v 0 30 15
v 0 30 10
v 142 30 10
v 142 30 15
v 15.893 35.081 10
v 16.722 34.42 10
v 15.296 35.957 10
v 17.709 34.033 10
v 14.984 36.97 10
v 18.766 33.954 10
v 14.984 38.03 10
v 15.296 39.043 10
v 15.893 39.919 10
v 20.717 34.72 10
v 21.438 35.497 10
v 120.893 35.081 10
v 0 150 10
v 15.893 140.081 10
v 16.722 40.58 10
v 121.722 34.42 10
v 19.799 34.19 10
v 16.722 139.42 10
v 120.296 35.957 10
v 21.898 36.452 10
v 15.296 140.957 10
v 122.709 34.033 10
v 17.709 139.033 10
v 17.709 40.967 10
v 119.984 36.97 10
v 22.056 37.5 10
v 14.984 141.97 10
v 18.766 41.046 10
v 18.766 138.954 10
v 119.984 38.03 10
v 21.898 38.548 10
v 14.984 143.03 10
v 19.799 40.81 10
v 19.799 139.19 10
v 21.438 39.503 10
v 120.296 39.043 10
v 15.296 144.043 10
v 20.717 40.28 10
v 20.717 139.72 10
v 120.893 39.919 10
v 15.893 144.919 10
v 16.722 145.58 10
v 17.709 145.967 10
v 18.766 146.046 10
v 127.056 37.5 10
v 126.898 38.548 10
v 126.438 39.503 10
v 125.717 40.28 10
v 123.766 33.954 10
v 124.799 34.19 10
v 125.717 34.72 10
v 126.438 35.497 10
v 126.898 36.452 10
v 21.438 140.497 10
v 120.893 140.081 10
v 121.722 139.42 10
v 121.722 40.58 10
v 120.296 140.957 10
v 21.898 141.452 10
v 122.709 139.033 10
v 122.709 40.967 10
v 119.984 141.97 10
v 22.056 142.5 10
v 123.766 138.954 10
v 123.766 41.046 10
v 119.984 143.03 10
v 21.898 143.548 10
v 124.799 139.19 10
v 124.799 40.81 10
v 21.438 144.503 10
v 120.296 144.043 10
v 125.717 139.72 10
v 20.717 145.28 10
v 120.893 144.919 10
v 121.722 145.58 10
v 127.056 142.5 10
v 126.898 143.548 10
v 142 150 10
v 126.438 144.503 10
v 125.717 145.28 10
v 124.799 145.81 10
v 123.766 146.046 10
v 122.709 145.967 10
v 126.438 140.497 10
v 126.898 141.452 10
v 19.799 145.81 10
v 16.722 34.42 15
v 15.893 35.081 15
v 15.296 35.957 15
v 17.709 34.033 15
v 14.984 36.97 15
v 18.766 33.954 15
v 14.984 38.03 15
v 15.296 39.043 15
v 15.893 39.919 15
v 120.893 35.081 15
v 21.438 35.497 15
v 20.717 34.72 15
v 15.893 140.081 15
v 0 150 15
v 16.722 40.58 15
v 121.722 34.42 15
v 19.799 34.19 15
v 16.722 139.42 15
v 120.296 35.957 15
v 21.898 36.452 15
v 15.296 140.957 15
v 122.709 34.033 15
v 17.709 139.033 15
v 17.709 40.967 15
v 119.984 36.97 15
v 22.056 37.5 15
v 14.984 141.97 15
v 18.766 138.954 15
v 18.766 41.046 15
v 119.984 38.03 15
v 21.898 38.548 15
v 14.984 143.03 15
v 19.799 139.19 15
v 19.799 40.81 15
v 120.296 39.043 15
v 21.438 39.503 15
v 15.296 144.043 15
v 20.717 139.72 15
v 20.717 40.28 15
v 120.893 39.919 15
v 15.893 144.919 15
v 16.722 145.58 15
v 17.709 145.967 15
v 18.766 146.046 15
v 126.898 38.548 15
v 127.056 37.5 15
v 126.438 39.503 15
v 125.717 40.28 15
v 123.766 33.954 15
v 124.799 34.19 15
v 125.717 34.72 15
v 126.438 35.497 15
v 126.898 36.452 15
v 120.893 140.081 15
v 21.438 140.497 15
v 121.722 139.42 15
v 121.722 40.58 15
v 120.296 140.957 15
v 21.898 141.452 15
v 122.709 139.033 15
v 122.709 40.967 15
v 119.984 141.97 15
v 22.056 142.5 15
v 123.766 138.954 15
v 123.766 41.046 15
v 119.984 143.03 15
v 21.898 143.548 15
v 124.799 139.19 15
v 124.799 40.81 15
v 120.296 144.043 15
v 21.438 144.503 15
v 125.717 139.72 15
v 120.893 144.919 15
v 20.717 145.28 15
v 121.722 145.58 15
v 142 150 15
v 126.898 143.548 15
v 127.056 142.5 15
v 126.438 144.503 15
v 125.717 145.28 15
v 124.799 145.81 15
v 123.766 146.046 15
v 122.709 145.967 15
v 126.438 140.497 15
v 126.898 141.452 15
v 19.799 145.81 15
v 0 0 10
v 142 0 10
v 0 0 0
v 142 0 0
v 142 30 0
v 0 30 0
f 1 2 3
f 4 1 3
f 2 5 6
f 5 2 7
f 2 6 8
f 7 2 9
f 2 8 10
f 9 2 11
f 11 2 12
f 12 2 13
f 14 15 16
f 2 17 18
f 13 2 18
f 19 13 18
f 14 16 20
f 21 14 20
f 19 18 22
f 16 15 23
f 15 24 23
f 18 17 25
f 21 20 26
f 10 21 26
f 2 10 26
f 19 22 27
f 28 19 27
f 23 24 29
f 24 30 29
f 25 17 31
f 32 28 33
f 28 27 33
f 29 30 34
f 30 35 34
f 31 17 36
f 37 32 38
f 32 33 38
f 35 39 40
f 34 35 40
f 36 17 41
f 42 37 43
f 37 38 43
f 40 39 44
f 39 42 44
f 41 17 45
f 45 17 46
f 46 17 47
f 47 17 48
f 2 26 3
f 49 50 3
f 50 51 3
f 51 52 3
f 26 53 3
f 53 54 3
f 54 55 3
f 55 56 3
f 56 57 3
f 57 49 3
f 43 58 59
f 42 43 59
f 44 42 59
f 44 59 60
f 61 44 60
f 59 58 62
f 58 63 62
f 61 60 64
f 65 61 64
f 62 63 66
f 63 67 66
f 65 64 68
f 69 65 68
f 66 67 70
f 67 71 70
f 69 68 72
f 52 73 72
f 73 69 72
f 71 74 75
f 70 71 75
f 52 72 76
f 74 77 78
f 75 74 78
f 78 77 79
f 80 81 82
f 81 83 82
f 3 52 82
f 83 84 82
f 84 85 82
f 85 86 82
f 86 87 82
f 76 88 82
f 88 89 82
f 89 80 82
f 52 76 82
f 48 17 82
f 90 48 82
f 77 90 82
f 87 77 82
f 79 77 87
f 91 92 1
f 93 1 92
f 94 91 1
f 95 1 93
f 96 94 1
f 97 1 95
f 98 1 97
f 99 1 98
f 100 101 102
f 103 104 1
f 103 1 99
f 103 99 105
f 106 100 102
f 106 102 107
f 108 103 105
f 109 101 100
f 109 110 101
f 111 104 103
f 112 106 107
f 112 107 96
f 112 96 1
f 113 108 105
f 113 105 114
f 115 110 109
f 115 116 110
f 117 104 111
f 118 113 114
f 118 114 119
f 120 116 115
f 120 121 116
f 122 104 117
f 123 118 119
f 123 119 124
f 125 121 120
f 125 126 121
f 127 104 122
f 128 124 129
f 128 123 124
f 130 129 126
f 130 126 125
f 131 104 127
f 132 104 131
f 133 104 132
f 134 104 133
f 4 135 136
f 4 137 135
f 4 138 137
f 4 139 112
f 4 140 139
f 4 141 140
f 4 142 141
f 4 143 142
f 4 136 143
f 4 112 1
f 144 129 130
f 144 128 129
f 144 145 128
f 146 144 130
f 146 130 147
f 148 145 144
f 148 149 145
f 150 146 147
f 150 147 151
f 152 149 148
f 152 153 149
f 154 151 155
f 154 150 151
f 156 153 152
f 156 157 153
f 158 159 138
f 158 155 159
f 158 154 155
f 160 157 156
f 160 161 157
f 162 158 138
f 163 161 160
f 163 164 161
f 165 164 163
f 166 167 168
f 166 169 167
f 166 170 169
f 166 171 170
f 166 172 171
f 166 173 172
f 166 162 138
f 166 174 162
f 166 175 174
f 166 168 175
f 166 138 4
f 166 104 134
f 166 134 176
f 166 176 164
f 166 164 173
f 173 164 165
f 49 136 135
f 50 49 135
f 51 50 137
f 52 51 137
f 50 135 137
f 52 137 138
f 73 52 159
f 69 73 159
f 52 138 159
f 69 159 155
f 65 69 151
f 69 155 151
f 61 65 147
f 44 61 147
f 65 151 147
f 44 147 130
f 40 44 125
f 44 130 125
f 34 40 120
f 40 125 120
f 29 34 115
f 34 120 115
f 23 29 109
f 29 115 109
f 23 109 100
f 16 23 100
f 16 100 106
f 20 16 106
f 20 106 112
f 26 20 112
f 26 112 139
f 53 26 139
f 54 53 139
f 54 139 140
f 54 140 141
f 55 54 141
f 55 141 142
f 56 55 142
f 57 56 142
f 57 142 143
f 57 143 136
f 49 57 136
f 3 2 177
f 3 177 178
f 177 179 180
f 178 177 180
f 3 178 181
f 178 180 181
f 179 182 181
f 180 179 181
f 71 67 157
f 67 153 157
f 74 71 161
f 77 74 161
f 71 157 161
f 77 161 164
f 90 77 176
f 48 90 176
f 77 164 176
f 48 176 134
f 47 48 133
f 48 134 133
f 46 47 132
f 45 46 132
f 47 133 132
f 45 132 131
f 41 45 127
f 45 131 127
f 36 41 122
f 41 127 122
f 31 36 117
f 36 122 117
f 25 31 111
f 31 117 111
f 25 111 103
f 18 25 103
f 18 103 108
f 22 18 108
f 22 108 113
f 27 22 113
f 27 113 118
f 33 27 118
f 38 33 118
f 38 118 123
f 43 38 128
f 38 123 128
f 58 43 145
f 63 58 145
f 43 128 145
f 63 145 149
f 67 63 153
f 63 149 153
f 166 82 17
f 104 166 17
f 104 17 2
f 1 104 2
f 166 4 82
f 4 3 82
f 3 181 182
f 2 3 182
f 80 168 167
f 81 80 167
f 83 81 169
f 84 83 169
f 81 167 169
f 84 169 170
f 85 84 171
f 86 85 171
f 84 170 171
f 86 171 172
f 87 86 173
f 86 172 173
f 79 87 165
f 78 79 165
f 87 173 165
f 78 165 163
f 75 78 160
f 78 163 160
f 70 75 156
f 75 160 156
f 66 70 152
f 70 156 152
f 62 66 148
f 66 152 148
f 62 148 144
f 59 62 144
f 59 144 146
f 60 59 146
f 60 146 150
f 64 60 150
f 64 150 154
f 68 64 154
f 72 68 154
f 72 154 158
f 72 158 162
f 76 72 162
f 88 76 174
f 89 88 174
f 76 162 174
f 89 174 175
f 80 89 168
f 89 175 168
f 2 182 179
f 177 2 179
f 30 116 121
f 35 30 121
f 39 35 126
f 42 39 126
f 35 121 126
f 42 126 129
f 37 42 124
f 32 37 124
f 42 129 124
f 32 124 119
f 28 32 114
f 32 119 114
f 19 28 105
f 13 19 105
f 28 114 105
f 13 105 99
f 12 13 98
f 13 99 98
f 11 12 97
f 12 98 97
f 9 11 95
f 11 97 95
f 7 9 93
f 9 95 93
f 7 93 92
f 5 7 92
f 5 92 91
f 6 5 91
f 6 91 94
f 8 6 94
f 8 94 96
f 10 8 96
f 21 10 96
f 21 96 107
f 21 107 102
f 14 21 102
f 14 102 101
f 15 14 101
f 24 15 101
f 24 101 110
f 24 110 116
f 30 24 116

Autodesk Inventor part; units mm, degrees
ref_plane "YZ Plane" through (0, 0, 0) normal (1, 0, 0) x (0, 1, 0)
ref_plane "XZ Plane" through (0, 0, 0) normal (0, 1, 0) x (-1, 0, 0)
ref_plane "XY Plane" through (0, 0, 0) normal (0, 0, 1) x (1, 0, 0)
sketch "Sketch1" plane through (0, 0, 0) normal (0, 0, 1) x (1, 0, 0)
  line L0 (0, 0) -> (142, 0)
  line L1 (142, 0) -> (142, 30)
  line L2 (142, 30) -> (0, 30)
  line L3 (0, 30) -> (0, 0)
  dimension "d0" = 30
  dimension "d1" = 142
extrude "Extrusion1" add sketch "Sketch1" along normal blind 10
sketch "Sketch2" plane through (0, 0, 10) normal (0, 0, 1) x (1, 0, 0)
  line L0 (0, 30) -> (0, 0) projected
  line L1 (0, 30) -> (142, 30)
  line L2 (142, 30) -> (142, 150)
  line L3 (142, 150) -> (0, 150)
  line L4 (0, 150) -> (0, 30)
  dimension "d4" = 120
extrude "Extrusion2" add sketch "Sketch2" along normal blind 5
sketch "Sketch3" plane through (0, 0, 15) normal (0, 0, 1) x (1, 0, 0)
  line L0 (142, 30) -> (142, 150) construction
  line L1 (142, 150) -> (0, 150) construction
  line L2 (0, 150) -> (0, 30) construction
  line L3 (0, 30) -> (142, 30) construction
  line L4 (18.5, 142.5) -> (123.5, 142.5) construction
  line L5 (123.5, 142.5) -> (123.5, 37.5) construction
  line L6 (123.5, 37.5) -> (18.5, 37.5) construction
  line L7 (18.5, 37.5) -> (18.5, 142.5) construction
  line L8 (142, 150) -> (0, 150) projected
  line L9 (71, 150) -> (71, 142.5) construction
  circle A0 centre (18.5, 142.5) radius 3.556
  circle A1 centre (123.5, 142.5) radius 3.556
  circle A2 centre (123.5, 37.5) radius 3.556
  circle A3 centre (18.5, 37.5) radius 3.556
  line L10 (71, 37.5) -> (71, 30) construction
  point P0 (0, 0)
  dimension "d7" = 105
  dimension "d8" = 7.112
extrude "Extrusion3" cut sketch "Sketch3" against normal blind 5
properties part number "Fan_Mount"
